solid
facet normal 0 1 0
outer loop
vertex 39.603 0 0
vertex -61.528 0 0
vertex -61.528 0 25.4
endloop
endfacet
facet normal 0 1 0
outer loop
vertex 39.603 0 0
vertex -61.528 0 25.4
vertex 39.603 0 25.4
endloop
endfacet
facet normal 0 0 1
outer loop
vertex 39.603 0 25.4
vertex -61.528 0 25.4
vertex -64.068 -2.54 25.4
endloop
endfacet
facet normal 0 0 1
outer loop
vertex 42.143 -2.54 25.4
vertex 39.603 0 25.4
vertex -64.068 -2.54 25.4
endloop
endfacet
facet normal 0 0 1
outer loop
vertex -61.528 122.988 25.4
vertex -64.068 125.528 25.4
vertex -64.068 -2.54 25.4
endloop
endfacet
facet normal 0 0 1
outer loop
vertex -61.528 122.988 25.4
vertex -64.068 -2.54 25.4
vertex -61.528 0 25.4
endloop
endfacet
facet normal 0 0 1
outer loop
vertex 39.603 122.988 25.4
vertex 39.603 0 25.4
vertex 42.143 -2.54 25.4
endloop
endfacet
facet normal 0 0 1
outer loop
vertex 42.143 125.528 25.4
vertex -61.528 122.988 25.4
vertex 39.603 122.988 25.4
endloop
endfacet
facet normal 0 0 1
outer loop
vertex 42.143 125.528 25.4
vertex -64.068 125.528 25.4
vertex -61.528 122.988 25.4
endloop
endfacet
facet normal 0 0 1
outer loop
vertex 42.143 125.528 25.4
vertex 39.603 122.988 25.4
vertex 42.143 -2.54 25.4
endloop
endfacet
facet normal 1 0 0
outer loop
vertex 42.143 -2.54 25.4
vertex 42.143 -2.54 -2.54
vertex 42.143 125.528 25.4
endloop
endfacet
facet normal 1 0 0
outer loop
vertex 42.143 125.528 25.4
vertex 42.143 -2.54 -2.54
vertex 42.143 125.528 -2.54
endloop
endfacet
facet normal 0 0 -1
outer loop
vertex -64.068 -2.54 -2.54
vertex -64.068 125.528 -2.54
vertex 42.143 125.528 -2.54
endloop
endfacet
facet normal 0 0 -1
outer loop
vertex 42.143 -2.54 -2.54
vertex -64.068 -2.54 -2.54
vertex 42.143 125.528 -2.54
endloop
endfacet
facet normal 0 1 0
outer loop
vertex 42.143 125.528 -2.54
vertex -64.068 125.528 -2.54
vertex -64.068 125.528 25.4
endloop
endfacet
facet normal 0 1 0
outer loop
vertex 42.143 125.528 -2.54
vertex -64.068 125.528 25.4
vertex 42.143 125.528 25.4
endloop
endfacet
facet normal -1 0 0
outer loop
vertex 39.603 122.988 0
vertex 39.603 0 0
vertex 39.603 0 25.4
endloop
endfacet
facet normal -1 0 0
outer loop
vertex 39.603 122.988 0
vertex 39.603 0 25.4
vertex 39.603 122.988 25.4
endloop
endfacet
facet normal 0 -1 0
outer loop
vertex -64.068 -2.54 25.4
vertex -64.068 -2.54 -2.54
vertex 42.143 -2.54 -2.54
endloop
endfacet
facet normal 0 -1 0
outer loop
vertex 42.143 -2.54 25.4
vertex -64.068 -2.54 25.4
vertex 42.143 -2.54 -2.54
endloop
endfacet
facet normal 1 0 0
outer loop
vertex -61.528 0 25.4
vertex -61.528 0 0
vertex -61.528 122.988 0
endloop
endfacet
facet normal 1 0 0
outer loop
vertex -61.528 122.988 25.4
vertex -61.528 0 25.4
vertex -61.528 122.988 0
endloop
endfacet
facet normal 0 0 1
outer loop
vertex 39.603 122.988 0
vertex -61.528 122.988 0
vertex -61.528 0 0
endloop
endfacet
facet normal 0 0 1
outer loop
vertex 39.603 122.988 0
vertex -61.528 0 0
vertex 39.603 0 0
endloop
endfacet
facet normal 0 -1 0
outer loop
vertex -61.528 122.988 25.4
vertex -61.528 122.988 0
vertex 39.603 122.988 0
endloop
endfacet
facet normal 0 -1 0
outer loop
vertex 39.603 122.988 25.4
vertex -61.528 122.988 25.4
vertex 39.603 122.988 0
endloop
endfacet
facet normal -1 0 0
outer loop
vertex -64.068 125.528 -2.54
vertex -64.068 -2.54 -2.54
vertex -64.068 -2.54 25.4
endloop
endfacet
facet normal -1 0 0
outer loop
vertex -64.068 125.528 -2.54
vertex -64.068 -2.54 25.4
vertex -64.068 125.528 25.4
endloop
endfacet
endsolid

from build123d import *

# Parameters (mm, degrees)
F0_W     = 111.9927763939
F0_H     = 27.0903408527
F1_DEPTH = 25.4
F0_W_2   = 101.1313535273
F0_H_2   = 122.9882985353
F3_T     = 2.54


with BuildPart() as f1:
    # F0 (on Top) → F1 (new body)
    with BuildSketch(Plane.XY):
        with Locations((-55.9963881969, 277.6345461607)):
            Rectangle(F0_W, F0_H)
    extrude(amount=F1_DEPTH)


with BuildPart() as f1b:
    # F0 (on Top) → F1, piece 2 (new body)
    with BuildSketch(Plane.XY):
        with Locations((-10.9623651952, 61.4941492677)):
            Rectangle(F0_W_2, F0_H_2)
    extrude(amount=F1_DEPTH)

    # F3
    f3_openings = [f1b.faces().sort_by_distance(p)[0] for p in [
        (-10.962365, 61.494149, 25.4),
    ]]
    offset(amount=F3_T, openings=f3_openings, kind=Kind.INTERSECTION)


solid = f1b.part
